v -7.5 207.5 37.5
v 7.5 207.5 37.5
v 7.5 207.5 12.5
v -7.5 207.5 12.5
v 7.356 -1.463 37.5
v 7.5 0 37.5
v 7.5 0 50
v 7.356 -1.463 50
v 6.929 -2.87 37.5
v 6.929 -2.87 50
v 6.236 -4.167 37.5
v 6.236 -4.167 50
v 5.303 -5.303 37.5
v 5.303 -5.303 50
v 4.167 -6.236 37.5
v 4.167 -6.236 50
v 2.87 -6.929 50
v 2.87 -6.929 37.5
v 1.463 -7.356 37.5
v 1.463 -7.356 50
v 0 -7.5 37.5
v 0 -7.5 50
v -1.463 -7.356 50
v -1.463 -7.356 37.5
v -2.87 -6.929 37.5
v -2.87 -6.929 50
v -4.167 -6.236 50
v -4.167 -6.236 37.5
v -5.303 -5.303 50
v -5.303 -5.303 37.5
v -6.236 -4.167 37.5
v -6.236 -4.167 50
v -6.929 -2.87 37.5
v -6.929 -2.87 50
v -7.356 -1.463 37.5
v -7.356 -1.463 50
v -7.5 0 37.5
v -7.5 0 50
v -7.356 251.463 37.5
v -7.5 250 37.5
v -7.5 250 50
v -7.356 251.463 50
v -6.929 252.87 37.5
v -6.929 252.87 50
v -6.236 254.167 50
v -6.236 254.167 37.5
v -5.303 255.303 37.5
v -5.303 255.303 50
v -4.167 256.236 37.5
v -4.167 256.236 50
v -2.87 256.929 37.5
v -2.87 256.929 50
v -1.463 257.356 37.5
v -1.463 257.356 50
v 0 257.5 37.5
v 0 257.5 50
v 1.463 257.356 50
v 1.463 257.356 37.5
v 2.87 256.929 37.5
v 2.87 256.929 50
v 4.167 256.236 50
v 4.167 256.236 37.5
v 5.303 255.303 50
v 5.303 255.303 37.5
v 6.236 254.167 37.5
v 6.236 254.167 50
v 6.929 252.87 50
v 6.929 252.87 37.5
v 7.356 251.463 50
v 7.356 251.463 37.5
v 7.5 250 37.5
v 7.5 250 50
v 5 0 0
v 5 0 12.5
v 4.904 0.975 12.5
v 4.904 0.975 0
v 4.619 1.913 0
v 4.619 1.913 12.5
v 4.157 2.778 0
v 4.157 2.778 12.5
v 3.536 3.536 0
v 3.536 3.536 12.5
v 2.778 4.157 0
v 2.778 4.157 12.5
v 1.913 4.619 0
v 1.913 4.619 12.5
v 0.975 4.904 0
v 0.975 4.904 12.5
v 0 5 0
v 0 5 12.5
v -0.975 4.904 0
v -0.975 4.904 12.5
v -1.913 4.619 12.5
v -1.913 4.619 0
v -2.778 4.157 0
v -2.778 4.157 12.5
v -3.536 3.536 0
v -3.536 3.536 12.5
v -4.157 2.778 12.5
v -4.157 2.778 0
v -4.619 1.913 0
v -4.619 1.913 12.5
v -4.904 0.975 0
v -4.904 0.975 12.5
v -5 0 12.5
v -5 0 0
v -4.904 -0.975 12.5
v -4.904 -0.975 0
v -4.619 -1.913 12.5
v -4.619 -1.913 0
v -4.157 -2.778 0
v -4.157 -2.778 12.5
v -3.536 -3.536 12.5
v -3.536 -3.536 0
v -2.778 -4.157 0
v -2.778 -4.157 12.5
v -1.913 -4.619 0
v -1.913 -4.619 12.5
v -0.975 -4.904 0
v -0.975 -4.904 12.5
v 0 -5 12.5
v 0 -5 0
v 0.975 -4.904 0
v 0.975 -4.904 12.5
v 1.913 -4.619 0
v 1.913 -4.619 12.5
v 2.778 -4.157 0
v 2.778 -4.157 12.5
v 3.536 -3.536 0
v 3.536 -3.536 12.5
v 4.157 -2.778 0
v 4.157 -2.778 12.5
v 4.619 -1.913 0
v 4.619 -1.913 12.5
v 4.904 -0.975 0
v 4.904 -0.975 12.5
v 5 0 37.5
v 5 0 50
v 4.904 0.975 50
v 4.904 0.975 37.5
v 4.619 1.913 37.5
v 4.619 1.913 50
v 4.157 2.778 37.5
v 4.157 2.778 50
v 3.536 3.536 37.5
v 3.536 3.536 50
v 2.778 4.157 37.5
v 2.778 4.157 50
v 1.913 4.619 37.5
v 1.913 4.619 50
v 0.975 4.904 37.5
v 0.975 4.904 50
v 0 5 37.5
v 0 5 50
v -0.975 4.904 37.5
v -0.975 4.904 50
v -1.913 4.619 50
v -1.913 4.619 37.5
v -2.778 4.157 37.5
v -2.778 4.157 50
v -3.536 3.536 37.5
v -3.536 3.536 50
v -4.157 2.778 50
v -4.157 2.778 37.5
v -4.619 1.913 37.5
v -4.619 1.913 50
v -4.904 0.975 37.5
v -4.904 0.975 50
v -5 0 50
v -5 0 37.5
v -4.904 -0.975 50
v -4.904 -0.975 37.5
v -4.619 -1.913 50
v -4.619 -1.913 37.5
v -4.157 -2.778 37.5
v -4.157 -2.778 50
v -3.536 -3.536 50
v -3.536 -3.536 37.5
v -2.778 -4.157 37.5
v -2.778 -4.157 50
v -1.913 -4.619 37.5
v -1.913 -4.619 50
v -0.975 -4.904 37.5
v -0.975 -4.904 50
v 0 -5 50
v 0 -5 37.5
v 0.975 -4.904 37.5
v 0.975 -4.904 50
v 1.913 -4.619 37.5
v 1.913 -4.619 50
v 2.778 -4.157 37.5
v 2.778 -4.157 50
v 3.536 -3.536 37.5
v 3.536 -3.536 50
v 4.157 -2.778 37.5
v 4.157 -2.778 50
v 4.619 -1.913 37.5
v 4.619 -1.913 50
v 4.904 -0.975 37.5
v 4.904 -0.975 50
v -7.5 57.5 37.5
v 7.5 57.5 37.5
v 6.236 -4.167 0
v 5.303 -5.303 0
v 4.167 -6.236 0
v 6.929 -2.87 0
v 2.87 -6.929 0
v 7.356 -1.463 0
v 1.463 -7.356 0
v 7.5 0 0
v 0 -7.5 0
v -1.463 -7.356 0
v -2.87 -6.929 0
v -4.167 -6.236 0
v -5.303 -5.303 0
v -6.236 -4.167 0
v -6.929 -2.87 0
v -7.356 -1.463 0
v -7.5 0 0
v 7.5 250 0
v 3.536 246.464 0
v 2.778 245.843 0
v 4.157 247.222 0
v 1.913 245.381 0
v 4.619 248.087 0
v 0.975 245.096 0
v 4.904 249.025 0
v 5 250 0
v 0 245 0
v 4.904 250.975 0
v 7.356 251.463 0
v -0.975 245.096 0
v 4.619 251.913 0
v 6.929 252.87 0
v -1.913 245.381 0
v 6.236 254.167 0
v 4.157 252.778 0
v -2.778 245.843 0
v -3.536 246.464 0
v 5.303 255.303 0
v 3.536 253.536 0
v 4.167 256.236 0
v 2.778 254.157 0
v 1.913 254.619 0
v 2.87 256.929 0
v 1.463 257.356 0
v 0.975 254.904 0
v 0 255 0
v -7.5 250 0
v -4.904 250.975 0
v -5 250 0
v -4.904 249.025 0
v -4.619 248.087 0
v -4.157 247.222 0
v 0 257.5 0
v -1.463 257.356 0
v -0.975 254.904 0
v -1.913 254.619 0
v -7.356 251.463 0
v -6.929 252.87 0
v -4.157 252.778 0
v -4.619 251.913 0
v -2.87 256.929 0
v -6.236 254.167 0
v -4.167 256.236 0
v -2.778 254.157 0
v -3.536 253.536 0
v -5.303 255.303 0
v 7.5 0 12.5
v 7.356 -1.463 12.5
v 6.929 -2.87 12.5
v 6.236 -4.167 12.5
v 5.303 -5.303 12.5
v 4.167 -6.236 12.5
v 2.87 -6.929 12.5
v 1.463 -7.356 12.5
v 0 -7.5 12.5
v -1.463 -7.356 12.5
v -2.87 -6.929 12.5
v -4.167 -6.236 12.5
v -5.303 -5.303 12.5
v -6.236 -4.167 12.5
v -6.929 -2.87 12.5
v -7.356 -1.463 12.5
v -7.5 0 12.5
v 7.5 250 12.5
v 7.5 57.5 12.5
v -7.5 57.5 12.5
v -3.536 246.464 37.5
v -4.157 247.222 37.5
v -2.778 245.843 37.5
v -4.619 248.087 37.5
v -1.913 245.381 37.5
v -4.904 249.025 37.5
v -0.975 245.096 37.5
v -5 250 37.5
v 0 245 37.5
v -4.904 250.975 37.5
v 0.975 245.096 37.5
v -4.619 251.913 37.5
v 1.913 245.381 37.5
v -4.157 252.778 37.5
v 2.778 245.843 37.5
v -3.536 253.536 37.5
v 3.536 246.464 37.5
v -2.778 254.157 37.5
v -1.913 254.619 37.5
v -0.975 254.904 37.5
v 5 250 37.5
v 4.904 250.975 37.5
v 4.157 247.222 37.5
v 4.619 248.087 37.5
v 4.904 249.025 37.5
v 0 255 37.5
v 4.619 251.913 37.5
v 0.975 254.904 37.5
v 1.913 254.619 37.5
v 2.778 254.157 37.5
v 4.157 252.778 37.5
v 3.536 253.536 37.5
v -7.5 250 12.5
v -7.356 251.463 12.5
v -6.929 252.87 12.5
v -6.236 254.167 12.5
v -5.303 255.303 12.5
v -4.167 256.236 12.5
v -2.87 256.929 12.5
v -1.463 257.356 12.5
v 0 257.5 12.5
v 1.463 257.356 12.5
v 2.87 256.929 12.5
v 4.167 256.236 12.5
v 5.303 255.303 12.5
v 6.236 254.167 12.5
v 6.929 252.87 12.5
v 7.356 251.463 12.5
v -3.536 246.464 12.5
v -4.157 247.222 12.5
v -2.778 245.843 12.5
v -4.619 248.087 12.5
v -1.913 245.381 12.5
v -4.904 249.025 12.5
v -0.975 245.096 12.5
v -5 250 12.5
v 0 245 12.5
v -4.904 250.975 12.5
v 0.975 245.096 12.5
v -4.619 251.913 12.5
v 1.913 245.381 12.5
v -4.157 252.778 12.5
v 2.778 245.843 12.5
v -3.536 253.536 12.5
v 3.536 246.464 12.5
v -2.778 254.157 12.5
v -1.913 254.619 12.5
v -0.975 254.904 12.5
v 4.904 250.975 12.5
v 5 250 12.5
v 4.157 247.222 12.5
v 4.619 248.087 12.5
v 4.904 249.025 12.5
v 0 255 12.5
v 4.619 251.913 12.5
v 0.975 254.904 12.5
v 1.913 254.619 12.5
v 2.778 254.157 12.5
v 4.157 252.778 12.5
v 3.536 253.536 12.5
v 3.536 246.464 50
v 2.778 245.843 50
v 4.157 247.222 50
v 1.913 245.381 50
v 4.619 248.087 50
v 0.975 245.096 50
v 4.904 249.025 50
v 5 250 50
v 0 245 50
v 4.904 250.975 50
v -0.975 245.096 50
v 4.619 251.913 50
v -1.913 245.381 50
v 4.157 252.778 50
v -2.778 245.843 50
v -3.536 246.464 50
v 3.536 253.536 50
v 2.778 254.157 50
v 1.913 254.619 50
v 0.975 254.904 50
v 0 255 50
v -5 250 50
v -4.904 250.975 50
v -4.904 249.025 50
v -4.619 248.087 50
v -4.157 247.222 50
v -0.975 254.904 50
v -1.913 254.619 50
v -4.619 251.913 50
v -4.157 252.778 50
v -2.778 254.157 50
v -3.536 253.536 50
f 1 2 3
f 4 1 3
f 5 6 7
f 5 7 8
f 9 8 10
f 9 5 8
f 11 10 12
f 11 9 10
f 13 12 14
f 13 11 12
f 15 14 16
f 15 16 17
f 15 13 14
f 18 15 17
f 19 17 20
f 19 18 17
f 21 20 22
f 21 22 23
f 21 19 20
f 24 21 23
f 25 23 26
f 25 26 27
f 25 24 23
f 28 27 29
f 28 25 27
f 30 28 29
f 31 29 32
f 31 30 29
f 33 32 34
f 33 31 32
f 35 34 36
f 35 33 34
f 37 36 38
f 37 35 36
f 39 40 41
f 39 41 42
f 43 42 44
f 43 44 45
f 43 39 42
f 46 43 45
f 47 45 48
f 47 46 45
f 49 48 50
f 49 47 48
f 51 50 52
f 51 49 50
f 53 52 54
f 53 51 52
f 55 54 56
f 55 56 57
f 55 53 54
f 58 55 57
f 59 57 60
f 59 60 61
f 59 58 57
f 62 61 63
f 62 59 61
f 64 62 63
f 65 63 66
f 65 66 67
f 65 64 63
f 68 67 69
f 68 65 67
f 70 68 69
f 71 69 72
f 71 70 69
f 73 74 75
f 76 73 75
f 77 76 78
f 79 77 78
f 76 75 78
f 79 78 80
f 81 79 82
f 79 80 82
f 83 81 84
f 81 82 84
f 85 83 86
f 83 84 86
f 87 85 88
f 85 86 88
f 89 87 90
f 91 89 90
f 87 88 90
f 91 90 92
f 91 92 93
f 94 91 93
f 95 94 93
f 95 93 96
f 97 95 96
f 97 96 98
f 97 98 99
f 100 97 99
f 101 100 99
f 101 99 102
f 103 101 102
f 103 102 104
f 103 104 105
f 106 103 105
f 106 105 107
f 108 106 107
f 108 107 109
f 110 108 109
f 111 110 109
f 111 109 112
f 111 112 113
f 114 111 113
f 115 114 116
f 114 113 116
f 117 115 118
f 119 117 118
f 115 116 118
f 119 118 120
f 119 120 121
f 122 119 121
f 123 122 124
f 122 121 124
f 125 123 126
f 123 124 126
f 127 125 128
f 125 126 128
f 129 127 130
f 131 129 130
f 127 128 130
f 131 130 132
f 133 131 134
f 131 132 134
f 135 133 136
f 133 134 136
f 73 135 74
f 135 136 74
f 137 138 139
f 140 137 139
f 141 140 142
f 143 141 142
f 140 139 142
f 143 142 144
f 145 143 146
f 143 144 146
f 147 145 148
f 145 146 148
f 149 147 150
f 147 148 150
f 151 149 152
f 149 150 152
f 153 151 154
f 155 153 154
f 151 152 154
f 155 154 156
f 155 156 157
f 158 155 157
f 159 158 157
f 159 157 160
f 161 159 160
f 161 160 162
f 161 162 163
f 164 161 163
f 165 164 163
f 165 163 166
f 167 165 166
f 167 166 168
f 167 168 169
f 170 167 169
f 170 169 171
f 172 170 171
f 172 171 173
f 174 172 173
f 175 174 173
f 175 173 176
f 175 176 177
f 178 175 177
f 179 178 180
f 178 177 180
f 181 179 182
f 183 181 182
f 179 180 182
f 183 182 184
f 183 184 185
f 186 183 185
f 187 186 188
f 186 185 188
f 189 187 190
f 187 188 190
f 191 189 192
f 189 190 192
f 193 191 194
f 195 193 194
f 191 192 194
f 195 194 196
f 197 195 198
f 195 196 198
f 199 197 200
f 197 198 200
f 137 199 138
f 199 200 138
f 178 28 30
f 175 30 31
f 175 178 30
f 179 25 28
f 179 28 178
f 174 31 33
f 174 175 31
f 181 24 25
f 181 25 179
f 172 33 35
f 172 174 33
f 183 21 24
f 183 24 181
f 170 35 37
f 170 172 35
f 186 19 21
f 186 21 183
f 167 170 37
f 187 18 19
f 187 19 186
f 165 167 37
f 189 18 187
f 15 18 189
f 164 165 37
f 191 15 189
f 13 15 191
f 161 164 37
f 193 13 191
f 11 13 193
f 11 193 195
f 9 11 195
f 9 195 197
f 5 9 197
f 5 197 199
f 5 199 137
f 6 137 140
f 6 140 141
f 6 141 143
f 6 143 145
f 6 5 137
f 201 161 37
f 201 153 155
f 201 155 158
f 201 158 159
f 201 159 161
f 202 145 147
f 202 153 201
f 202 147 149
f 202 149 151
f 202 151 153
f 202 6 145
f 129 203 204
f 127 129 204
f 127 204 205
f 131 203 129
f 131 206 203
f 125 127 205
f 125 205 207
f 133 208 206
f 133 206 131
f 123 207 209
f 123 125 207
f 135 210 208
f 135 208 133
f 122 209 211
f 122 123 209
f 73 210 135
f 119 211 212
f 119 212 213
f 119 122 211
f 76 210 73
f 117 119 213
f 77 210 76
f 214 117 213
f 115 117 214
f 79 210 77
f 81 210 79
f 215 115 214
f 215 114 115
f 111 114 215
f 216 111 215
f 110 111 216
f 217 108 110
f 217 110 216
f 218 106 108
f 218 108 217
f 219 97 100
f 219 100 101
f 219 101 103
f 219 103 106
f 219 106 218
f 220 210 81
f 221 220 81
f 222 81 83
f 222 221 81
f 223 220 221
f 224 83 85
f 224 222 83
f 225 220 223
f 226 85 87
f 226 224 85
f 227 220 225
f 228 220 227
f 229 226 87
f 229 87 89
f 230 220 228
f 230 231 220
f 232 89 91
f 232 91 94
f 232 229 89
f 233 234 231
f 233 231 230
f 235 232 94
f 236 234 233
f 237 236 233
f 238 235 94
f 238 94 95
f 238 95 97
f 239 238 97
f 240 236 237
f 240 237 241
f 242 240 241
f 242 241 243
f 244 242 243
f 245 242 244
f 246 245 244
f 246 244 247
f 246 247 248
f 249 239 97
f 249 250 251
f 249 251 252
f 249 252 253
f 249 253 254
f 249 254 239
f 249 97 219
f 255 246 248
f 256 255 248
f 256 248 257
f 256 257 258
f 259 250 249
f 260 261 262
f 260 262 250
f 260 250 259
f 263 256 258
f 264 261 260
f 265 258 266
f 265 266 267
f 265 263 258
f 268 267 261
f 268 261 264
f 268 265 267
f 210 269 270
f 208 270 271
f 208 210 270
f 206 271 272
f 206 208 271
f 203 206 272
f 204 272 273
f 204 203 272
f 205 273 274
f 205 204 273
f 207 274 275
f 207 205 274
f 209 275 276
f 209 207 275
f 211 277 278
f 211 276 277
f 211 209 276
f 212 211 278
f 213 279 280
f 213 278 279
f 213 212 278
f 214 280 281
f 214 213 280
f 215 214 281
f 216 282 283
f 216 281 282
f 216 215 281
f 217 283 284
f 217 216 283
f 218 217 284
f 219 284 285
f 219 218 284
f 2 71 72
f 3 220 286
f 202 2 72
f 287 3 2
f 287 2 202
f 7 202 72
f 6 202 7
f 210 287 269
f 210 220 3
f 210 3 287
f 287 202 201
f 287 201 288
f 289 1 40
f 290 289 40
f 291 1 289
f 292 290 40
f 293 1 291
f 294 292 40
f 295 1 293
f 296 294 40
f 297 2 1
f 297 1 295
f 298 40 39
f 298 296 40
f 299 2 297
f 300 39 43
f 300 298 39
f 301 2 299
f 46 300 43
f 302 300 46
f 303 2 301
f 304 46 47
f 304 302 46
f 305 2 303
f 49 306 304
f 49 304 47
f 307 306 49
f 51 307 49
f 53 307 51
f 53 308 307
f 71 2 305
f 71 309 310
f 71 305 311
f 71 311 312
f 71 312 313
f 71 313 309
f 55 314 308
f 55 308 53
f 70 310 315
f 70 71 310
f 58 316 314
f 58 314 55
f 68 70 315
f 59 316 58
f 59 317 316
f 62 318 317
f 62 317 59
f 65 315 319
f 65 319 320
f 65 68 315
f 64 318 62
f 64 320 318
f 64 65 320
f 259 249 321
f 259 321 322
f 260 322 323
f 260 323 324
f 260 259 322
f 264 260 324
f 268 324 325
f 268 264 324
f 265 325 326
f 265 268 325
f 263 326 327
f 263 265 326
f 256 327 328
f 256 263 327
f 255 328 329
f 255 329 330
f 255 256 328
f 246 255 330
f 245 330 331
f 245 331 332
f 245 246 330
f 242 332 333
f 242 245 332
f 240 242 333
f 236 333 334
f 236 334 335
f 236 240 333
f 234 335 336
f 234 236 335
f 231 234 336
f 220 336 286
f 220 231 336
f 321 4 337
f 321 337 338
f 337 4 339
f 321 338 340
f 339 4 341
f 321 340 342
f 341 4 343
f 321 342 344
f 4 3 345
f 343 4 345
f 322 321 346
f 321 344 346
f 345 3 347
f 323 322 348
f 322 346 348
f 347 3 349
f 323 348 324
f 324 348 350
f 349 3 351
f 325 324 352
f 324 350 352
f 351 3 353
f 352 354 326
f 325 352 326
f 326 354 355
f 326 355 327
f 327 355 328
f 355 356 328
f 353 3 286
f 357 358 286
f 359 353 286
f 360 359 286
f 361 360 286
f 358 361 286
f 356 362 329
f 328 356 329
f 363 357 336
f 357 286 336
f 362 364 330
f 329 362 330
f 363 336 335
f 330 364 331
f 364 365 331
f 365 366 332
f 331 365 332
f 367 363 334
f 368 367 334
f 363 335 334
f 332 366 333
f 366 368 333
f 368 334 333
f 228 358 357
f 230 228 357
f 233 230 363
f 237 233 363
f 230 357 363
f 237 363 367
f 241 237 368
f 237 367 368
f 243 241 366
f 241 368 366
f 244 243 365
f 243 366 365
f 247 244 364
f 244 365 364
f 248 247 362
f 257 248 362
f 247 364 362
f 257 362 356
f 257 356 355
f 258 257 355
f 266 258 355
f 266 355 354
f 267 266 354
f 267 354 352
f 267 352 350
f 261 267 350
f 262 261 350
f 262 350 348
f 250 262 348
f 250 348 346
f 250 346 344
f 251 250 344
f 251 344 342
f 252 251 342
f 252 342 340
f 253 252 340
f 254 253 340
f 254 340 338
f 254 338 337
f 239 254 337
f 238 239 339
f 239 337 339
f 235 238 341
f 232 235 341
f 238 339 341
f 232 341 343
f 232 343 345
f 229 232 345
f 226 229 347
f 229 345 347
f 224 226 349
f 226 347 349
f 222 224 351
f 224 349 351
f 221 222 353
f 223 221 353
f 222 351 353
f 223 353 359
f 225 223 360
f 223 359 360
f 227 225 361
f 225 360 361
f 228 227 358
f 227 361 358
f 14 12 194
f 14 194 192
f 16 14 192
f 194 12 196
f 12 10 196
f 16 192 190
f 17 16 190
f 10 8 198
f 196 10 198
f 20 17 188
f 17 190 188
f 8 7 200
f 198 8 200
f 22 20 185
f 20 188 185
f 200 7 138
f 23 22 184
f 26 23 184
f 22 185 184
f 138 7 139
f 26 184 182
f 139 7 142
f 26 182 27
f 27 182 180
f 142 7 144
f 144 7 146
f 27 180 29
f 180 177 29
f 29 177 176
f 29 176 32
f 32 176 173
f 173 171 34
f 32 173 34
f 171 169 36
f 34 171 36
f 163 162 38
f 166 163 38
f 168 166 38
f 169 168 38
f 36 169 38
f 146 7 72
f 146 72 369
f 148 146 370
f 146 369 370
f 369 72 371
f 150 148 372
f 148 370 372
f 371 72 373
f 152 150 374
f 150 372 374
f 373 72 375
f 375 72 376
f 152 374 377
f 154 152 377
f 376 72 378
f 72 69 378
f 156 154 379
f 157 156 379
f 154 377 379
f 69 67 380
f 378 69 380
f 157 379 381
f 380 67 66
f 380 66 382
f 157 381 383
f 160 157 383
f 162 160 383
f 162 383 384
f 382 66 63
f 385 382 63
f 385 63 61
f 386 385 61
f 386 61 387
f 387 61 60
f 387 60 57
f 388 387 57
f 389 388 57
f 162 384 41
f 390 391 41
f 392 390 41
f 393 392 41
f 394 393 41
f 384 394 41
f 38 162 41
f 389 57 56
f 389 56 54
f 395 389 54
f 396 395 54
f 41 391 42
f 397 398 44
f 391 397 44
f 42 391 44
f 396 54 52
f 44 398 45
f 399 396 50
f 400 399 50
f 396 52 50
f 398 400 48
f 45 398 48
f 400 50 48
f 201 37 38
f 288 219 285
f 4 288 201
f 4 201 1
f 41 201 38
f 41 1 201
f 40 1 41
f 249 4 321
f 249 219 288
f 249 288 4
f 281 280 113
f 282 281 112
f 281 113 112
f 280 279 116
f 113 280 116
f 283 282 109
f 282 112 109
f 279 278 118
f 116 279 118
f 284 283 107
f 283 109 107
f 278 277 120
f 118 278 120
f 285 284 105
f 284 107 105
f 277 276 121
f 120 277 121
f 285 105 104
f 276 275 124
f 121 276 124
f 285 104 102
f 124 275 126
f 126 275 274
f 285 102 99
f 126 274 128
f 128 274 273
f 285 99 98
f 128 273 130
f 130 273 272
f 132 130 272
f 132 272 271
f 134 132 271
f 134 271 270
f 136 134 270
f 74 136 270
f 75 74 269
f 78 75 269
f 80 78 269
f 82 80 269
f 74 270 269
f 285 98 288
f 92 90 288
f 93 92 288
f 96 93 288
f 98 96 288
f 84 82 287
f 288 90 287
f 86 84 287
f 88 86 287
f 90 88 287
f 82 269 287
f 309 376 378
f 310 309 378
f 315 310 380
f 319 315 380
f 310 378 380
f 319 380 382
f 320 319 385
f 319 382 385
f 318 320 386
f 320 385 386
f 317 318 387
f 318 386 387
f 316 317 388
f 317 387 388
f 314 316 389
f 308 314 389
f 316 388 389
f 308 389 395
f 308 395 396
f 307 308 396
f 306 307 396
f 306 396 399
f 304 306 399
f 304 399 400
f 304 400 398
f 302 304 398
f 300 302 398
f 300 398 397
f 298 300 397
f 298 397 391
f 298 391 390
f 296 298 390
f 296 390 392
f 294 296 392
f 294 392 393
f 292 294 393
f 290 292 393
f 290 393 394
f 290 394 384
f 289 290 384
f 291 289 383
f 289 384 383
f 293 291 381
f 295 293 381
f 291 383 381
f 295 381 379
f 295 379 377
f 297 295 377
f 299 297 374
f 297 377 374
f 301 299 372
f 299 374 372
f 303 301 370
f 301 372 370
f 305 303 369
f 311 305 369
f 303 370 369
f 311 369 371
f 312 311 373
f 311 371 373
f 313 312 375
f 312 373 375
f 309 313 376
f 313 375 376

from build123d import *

# Parameters (mm, degrees)
EXTRUDE_1_DEPTH     = 50
SKETCH_2_W          = 25
SKETCH_2_H          = 50
SKETCH_2_H_2        = 65
CUT_EXTRUDE_1_DEPTH = 263.737987356
SKETCH_3_R          = 5
CUT_EXTRUDE_2_DEPTH = 263.416653435


with BuildPart() as part:
    # 草图1 → 凸台-拉伸1 (new body)
    with BuildSketch(Plane.XY):
        with BuildLine():
            Line((-7.5, 0), (-7.5, 250))
            ThreePointArc((-7.5, 250), (0, 257.5), (7.5, 250))
            Line((7.5, 250), (7.5, 0))
            ThreePointArc((7.5, 0), (0, -7.5), (-7.5, 0))
        make_face()
    extrude(amount=EXTRUDE_1_DEPTH)

    # 草图2 → 切除-拉伸1 (cut, through all)
    with BuildSketch(Plane(origin=(7.5, 0, 0), x_dir=(0, 0, -1), z_dir=(1, 0, 0))):
        with Locations((-25, 232.5)):
            Rectangle(SKETCH_2_W, SKETCH_2_H)
        with Locations((-25, 25)):
            Rectangle(SKETCH_2_W, SKETCH_2_H_2)
    extrude(amount=-CUT_EXTRUDE_1_DEPTH, mode=Mode.SUBTRACT)

    # 草图3 → 切除-拉伸2 (cut, through all)
    with BuildSketch(Plane.XY.offset(50)):
        with Locations((0, 250)):
            Circle(SKETCH_3_R)
        Circle(SKETCH_3_R)
    extrude(amount=-CUT_EXTRUDE_2_DEPTH, mode=Mode.SUBTRACT)


solid = part.part
